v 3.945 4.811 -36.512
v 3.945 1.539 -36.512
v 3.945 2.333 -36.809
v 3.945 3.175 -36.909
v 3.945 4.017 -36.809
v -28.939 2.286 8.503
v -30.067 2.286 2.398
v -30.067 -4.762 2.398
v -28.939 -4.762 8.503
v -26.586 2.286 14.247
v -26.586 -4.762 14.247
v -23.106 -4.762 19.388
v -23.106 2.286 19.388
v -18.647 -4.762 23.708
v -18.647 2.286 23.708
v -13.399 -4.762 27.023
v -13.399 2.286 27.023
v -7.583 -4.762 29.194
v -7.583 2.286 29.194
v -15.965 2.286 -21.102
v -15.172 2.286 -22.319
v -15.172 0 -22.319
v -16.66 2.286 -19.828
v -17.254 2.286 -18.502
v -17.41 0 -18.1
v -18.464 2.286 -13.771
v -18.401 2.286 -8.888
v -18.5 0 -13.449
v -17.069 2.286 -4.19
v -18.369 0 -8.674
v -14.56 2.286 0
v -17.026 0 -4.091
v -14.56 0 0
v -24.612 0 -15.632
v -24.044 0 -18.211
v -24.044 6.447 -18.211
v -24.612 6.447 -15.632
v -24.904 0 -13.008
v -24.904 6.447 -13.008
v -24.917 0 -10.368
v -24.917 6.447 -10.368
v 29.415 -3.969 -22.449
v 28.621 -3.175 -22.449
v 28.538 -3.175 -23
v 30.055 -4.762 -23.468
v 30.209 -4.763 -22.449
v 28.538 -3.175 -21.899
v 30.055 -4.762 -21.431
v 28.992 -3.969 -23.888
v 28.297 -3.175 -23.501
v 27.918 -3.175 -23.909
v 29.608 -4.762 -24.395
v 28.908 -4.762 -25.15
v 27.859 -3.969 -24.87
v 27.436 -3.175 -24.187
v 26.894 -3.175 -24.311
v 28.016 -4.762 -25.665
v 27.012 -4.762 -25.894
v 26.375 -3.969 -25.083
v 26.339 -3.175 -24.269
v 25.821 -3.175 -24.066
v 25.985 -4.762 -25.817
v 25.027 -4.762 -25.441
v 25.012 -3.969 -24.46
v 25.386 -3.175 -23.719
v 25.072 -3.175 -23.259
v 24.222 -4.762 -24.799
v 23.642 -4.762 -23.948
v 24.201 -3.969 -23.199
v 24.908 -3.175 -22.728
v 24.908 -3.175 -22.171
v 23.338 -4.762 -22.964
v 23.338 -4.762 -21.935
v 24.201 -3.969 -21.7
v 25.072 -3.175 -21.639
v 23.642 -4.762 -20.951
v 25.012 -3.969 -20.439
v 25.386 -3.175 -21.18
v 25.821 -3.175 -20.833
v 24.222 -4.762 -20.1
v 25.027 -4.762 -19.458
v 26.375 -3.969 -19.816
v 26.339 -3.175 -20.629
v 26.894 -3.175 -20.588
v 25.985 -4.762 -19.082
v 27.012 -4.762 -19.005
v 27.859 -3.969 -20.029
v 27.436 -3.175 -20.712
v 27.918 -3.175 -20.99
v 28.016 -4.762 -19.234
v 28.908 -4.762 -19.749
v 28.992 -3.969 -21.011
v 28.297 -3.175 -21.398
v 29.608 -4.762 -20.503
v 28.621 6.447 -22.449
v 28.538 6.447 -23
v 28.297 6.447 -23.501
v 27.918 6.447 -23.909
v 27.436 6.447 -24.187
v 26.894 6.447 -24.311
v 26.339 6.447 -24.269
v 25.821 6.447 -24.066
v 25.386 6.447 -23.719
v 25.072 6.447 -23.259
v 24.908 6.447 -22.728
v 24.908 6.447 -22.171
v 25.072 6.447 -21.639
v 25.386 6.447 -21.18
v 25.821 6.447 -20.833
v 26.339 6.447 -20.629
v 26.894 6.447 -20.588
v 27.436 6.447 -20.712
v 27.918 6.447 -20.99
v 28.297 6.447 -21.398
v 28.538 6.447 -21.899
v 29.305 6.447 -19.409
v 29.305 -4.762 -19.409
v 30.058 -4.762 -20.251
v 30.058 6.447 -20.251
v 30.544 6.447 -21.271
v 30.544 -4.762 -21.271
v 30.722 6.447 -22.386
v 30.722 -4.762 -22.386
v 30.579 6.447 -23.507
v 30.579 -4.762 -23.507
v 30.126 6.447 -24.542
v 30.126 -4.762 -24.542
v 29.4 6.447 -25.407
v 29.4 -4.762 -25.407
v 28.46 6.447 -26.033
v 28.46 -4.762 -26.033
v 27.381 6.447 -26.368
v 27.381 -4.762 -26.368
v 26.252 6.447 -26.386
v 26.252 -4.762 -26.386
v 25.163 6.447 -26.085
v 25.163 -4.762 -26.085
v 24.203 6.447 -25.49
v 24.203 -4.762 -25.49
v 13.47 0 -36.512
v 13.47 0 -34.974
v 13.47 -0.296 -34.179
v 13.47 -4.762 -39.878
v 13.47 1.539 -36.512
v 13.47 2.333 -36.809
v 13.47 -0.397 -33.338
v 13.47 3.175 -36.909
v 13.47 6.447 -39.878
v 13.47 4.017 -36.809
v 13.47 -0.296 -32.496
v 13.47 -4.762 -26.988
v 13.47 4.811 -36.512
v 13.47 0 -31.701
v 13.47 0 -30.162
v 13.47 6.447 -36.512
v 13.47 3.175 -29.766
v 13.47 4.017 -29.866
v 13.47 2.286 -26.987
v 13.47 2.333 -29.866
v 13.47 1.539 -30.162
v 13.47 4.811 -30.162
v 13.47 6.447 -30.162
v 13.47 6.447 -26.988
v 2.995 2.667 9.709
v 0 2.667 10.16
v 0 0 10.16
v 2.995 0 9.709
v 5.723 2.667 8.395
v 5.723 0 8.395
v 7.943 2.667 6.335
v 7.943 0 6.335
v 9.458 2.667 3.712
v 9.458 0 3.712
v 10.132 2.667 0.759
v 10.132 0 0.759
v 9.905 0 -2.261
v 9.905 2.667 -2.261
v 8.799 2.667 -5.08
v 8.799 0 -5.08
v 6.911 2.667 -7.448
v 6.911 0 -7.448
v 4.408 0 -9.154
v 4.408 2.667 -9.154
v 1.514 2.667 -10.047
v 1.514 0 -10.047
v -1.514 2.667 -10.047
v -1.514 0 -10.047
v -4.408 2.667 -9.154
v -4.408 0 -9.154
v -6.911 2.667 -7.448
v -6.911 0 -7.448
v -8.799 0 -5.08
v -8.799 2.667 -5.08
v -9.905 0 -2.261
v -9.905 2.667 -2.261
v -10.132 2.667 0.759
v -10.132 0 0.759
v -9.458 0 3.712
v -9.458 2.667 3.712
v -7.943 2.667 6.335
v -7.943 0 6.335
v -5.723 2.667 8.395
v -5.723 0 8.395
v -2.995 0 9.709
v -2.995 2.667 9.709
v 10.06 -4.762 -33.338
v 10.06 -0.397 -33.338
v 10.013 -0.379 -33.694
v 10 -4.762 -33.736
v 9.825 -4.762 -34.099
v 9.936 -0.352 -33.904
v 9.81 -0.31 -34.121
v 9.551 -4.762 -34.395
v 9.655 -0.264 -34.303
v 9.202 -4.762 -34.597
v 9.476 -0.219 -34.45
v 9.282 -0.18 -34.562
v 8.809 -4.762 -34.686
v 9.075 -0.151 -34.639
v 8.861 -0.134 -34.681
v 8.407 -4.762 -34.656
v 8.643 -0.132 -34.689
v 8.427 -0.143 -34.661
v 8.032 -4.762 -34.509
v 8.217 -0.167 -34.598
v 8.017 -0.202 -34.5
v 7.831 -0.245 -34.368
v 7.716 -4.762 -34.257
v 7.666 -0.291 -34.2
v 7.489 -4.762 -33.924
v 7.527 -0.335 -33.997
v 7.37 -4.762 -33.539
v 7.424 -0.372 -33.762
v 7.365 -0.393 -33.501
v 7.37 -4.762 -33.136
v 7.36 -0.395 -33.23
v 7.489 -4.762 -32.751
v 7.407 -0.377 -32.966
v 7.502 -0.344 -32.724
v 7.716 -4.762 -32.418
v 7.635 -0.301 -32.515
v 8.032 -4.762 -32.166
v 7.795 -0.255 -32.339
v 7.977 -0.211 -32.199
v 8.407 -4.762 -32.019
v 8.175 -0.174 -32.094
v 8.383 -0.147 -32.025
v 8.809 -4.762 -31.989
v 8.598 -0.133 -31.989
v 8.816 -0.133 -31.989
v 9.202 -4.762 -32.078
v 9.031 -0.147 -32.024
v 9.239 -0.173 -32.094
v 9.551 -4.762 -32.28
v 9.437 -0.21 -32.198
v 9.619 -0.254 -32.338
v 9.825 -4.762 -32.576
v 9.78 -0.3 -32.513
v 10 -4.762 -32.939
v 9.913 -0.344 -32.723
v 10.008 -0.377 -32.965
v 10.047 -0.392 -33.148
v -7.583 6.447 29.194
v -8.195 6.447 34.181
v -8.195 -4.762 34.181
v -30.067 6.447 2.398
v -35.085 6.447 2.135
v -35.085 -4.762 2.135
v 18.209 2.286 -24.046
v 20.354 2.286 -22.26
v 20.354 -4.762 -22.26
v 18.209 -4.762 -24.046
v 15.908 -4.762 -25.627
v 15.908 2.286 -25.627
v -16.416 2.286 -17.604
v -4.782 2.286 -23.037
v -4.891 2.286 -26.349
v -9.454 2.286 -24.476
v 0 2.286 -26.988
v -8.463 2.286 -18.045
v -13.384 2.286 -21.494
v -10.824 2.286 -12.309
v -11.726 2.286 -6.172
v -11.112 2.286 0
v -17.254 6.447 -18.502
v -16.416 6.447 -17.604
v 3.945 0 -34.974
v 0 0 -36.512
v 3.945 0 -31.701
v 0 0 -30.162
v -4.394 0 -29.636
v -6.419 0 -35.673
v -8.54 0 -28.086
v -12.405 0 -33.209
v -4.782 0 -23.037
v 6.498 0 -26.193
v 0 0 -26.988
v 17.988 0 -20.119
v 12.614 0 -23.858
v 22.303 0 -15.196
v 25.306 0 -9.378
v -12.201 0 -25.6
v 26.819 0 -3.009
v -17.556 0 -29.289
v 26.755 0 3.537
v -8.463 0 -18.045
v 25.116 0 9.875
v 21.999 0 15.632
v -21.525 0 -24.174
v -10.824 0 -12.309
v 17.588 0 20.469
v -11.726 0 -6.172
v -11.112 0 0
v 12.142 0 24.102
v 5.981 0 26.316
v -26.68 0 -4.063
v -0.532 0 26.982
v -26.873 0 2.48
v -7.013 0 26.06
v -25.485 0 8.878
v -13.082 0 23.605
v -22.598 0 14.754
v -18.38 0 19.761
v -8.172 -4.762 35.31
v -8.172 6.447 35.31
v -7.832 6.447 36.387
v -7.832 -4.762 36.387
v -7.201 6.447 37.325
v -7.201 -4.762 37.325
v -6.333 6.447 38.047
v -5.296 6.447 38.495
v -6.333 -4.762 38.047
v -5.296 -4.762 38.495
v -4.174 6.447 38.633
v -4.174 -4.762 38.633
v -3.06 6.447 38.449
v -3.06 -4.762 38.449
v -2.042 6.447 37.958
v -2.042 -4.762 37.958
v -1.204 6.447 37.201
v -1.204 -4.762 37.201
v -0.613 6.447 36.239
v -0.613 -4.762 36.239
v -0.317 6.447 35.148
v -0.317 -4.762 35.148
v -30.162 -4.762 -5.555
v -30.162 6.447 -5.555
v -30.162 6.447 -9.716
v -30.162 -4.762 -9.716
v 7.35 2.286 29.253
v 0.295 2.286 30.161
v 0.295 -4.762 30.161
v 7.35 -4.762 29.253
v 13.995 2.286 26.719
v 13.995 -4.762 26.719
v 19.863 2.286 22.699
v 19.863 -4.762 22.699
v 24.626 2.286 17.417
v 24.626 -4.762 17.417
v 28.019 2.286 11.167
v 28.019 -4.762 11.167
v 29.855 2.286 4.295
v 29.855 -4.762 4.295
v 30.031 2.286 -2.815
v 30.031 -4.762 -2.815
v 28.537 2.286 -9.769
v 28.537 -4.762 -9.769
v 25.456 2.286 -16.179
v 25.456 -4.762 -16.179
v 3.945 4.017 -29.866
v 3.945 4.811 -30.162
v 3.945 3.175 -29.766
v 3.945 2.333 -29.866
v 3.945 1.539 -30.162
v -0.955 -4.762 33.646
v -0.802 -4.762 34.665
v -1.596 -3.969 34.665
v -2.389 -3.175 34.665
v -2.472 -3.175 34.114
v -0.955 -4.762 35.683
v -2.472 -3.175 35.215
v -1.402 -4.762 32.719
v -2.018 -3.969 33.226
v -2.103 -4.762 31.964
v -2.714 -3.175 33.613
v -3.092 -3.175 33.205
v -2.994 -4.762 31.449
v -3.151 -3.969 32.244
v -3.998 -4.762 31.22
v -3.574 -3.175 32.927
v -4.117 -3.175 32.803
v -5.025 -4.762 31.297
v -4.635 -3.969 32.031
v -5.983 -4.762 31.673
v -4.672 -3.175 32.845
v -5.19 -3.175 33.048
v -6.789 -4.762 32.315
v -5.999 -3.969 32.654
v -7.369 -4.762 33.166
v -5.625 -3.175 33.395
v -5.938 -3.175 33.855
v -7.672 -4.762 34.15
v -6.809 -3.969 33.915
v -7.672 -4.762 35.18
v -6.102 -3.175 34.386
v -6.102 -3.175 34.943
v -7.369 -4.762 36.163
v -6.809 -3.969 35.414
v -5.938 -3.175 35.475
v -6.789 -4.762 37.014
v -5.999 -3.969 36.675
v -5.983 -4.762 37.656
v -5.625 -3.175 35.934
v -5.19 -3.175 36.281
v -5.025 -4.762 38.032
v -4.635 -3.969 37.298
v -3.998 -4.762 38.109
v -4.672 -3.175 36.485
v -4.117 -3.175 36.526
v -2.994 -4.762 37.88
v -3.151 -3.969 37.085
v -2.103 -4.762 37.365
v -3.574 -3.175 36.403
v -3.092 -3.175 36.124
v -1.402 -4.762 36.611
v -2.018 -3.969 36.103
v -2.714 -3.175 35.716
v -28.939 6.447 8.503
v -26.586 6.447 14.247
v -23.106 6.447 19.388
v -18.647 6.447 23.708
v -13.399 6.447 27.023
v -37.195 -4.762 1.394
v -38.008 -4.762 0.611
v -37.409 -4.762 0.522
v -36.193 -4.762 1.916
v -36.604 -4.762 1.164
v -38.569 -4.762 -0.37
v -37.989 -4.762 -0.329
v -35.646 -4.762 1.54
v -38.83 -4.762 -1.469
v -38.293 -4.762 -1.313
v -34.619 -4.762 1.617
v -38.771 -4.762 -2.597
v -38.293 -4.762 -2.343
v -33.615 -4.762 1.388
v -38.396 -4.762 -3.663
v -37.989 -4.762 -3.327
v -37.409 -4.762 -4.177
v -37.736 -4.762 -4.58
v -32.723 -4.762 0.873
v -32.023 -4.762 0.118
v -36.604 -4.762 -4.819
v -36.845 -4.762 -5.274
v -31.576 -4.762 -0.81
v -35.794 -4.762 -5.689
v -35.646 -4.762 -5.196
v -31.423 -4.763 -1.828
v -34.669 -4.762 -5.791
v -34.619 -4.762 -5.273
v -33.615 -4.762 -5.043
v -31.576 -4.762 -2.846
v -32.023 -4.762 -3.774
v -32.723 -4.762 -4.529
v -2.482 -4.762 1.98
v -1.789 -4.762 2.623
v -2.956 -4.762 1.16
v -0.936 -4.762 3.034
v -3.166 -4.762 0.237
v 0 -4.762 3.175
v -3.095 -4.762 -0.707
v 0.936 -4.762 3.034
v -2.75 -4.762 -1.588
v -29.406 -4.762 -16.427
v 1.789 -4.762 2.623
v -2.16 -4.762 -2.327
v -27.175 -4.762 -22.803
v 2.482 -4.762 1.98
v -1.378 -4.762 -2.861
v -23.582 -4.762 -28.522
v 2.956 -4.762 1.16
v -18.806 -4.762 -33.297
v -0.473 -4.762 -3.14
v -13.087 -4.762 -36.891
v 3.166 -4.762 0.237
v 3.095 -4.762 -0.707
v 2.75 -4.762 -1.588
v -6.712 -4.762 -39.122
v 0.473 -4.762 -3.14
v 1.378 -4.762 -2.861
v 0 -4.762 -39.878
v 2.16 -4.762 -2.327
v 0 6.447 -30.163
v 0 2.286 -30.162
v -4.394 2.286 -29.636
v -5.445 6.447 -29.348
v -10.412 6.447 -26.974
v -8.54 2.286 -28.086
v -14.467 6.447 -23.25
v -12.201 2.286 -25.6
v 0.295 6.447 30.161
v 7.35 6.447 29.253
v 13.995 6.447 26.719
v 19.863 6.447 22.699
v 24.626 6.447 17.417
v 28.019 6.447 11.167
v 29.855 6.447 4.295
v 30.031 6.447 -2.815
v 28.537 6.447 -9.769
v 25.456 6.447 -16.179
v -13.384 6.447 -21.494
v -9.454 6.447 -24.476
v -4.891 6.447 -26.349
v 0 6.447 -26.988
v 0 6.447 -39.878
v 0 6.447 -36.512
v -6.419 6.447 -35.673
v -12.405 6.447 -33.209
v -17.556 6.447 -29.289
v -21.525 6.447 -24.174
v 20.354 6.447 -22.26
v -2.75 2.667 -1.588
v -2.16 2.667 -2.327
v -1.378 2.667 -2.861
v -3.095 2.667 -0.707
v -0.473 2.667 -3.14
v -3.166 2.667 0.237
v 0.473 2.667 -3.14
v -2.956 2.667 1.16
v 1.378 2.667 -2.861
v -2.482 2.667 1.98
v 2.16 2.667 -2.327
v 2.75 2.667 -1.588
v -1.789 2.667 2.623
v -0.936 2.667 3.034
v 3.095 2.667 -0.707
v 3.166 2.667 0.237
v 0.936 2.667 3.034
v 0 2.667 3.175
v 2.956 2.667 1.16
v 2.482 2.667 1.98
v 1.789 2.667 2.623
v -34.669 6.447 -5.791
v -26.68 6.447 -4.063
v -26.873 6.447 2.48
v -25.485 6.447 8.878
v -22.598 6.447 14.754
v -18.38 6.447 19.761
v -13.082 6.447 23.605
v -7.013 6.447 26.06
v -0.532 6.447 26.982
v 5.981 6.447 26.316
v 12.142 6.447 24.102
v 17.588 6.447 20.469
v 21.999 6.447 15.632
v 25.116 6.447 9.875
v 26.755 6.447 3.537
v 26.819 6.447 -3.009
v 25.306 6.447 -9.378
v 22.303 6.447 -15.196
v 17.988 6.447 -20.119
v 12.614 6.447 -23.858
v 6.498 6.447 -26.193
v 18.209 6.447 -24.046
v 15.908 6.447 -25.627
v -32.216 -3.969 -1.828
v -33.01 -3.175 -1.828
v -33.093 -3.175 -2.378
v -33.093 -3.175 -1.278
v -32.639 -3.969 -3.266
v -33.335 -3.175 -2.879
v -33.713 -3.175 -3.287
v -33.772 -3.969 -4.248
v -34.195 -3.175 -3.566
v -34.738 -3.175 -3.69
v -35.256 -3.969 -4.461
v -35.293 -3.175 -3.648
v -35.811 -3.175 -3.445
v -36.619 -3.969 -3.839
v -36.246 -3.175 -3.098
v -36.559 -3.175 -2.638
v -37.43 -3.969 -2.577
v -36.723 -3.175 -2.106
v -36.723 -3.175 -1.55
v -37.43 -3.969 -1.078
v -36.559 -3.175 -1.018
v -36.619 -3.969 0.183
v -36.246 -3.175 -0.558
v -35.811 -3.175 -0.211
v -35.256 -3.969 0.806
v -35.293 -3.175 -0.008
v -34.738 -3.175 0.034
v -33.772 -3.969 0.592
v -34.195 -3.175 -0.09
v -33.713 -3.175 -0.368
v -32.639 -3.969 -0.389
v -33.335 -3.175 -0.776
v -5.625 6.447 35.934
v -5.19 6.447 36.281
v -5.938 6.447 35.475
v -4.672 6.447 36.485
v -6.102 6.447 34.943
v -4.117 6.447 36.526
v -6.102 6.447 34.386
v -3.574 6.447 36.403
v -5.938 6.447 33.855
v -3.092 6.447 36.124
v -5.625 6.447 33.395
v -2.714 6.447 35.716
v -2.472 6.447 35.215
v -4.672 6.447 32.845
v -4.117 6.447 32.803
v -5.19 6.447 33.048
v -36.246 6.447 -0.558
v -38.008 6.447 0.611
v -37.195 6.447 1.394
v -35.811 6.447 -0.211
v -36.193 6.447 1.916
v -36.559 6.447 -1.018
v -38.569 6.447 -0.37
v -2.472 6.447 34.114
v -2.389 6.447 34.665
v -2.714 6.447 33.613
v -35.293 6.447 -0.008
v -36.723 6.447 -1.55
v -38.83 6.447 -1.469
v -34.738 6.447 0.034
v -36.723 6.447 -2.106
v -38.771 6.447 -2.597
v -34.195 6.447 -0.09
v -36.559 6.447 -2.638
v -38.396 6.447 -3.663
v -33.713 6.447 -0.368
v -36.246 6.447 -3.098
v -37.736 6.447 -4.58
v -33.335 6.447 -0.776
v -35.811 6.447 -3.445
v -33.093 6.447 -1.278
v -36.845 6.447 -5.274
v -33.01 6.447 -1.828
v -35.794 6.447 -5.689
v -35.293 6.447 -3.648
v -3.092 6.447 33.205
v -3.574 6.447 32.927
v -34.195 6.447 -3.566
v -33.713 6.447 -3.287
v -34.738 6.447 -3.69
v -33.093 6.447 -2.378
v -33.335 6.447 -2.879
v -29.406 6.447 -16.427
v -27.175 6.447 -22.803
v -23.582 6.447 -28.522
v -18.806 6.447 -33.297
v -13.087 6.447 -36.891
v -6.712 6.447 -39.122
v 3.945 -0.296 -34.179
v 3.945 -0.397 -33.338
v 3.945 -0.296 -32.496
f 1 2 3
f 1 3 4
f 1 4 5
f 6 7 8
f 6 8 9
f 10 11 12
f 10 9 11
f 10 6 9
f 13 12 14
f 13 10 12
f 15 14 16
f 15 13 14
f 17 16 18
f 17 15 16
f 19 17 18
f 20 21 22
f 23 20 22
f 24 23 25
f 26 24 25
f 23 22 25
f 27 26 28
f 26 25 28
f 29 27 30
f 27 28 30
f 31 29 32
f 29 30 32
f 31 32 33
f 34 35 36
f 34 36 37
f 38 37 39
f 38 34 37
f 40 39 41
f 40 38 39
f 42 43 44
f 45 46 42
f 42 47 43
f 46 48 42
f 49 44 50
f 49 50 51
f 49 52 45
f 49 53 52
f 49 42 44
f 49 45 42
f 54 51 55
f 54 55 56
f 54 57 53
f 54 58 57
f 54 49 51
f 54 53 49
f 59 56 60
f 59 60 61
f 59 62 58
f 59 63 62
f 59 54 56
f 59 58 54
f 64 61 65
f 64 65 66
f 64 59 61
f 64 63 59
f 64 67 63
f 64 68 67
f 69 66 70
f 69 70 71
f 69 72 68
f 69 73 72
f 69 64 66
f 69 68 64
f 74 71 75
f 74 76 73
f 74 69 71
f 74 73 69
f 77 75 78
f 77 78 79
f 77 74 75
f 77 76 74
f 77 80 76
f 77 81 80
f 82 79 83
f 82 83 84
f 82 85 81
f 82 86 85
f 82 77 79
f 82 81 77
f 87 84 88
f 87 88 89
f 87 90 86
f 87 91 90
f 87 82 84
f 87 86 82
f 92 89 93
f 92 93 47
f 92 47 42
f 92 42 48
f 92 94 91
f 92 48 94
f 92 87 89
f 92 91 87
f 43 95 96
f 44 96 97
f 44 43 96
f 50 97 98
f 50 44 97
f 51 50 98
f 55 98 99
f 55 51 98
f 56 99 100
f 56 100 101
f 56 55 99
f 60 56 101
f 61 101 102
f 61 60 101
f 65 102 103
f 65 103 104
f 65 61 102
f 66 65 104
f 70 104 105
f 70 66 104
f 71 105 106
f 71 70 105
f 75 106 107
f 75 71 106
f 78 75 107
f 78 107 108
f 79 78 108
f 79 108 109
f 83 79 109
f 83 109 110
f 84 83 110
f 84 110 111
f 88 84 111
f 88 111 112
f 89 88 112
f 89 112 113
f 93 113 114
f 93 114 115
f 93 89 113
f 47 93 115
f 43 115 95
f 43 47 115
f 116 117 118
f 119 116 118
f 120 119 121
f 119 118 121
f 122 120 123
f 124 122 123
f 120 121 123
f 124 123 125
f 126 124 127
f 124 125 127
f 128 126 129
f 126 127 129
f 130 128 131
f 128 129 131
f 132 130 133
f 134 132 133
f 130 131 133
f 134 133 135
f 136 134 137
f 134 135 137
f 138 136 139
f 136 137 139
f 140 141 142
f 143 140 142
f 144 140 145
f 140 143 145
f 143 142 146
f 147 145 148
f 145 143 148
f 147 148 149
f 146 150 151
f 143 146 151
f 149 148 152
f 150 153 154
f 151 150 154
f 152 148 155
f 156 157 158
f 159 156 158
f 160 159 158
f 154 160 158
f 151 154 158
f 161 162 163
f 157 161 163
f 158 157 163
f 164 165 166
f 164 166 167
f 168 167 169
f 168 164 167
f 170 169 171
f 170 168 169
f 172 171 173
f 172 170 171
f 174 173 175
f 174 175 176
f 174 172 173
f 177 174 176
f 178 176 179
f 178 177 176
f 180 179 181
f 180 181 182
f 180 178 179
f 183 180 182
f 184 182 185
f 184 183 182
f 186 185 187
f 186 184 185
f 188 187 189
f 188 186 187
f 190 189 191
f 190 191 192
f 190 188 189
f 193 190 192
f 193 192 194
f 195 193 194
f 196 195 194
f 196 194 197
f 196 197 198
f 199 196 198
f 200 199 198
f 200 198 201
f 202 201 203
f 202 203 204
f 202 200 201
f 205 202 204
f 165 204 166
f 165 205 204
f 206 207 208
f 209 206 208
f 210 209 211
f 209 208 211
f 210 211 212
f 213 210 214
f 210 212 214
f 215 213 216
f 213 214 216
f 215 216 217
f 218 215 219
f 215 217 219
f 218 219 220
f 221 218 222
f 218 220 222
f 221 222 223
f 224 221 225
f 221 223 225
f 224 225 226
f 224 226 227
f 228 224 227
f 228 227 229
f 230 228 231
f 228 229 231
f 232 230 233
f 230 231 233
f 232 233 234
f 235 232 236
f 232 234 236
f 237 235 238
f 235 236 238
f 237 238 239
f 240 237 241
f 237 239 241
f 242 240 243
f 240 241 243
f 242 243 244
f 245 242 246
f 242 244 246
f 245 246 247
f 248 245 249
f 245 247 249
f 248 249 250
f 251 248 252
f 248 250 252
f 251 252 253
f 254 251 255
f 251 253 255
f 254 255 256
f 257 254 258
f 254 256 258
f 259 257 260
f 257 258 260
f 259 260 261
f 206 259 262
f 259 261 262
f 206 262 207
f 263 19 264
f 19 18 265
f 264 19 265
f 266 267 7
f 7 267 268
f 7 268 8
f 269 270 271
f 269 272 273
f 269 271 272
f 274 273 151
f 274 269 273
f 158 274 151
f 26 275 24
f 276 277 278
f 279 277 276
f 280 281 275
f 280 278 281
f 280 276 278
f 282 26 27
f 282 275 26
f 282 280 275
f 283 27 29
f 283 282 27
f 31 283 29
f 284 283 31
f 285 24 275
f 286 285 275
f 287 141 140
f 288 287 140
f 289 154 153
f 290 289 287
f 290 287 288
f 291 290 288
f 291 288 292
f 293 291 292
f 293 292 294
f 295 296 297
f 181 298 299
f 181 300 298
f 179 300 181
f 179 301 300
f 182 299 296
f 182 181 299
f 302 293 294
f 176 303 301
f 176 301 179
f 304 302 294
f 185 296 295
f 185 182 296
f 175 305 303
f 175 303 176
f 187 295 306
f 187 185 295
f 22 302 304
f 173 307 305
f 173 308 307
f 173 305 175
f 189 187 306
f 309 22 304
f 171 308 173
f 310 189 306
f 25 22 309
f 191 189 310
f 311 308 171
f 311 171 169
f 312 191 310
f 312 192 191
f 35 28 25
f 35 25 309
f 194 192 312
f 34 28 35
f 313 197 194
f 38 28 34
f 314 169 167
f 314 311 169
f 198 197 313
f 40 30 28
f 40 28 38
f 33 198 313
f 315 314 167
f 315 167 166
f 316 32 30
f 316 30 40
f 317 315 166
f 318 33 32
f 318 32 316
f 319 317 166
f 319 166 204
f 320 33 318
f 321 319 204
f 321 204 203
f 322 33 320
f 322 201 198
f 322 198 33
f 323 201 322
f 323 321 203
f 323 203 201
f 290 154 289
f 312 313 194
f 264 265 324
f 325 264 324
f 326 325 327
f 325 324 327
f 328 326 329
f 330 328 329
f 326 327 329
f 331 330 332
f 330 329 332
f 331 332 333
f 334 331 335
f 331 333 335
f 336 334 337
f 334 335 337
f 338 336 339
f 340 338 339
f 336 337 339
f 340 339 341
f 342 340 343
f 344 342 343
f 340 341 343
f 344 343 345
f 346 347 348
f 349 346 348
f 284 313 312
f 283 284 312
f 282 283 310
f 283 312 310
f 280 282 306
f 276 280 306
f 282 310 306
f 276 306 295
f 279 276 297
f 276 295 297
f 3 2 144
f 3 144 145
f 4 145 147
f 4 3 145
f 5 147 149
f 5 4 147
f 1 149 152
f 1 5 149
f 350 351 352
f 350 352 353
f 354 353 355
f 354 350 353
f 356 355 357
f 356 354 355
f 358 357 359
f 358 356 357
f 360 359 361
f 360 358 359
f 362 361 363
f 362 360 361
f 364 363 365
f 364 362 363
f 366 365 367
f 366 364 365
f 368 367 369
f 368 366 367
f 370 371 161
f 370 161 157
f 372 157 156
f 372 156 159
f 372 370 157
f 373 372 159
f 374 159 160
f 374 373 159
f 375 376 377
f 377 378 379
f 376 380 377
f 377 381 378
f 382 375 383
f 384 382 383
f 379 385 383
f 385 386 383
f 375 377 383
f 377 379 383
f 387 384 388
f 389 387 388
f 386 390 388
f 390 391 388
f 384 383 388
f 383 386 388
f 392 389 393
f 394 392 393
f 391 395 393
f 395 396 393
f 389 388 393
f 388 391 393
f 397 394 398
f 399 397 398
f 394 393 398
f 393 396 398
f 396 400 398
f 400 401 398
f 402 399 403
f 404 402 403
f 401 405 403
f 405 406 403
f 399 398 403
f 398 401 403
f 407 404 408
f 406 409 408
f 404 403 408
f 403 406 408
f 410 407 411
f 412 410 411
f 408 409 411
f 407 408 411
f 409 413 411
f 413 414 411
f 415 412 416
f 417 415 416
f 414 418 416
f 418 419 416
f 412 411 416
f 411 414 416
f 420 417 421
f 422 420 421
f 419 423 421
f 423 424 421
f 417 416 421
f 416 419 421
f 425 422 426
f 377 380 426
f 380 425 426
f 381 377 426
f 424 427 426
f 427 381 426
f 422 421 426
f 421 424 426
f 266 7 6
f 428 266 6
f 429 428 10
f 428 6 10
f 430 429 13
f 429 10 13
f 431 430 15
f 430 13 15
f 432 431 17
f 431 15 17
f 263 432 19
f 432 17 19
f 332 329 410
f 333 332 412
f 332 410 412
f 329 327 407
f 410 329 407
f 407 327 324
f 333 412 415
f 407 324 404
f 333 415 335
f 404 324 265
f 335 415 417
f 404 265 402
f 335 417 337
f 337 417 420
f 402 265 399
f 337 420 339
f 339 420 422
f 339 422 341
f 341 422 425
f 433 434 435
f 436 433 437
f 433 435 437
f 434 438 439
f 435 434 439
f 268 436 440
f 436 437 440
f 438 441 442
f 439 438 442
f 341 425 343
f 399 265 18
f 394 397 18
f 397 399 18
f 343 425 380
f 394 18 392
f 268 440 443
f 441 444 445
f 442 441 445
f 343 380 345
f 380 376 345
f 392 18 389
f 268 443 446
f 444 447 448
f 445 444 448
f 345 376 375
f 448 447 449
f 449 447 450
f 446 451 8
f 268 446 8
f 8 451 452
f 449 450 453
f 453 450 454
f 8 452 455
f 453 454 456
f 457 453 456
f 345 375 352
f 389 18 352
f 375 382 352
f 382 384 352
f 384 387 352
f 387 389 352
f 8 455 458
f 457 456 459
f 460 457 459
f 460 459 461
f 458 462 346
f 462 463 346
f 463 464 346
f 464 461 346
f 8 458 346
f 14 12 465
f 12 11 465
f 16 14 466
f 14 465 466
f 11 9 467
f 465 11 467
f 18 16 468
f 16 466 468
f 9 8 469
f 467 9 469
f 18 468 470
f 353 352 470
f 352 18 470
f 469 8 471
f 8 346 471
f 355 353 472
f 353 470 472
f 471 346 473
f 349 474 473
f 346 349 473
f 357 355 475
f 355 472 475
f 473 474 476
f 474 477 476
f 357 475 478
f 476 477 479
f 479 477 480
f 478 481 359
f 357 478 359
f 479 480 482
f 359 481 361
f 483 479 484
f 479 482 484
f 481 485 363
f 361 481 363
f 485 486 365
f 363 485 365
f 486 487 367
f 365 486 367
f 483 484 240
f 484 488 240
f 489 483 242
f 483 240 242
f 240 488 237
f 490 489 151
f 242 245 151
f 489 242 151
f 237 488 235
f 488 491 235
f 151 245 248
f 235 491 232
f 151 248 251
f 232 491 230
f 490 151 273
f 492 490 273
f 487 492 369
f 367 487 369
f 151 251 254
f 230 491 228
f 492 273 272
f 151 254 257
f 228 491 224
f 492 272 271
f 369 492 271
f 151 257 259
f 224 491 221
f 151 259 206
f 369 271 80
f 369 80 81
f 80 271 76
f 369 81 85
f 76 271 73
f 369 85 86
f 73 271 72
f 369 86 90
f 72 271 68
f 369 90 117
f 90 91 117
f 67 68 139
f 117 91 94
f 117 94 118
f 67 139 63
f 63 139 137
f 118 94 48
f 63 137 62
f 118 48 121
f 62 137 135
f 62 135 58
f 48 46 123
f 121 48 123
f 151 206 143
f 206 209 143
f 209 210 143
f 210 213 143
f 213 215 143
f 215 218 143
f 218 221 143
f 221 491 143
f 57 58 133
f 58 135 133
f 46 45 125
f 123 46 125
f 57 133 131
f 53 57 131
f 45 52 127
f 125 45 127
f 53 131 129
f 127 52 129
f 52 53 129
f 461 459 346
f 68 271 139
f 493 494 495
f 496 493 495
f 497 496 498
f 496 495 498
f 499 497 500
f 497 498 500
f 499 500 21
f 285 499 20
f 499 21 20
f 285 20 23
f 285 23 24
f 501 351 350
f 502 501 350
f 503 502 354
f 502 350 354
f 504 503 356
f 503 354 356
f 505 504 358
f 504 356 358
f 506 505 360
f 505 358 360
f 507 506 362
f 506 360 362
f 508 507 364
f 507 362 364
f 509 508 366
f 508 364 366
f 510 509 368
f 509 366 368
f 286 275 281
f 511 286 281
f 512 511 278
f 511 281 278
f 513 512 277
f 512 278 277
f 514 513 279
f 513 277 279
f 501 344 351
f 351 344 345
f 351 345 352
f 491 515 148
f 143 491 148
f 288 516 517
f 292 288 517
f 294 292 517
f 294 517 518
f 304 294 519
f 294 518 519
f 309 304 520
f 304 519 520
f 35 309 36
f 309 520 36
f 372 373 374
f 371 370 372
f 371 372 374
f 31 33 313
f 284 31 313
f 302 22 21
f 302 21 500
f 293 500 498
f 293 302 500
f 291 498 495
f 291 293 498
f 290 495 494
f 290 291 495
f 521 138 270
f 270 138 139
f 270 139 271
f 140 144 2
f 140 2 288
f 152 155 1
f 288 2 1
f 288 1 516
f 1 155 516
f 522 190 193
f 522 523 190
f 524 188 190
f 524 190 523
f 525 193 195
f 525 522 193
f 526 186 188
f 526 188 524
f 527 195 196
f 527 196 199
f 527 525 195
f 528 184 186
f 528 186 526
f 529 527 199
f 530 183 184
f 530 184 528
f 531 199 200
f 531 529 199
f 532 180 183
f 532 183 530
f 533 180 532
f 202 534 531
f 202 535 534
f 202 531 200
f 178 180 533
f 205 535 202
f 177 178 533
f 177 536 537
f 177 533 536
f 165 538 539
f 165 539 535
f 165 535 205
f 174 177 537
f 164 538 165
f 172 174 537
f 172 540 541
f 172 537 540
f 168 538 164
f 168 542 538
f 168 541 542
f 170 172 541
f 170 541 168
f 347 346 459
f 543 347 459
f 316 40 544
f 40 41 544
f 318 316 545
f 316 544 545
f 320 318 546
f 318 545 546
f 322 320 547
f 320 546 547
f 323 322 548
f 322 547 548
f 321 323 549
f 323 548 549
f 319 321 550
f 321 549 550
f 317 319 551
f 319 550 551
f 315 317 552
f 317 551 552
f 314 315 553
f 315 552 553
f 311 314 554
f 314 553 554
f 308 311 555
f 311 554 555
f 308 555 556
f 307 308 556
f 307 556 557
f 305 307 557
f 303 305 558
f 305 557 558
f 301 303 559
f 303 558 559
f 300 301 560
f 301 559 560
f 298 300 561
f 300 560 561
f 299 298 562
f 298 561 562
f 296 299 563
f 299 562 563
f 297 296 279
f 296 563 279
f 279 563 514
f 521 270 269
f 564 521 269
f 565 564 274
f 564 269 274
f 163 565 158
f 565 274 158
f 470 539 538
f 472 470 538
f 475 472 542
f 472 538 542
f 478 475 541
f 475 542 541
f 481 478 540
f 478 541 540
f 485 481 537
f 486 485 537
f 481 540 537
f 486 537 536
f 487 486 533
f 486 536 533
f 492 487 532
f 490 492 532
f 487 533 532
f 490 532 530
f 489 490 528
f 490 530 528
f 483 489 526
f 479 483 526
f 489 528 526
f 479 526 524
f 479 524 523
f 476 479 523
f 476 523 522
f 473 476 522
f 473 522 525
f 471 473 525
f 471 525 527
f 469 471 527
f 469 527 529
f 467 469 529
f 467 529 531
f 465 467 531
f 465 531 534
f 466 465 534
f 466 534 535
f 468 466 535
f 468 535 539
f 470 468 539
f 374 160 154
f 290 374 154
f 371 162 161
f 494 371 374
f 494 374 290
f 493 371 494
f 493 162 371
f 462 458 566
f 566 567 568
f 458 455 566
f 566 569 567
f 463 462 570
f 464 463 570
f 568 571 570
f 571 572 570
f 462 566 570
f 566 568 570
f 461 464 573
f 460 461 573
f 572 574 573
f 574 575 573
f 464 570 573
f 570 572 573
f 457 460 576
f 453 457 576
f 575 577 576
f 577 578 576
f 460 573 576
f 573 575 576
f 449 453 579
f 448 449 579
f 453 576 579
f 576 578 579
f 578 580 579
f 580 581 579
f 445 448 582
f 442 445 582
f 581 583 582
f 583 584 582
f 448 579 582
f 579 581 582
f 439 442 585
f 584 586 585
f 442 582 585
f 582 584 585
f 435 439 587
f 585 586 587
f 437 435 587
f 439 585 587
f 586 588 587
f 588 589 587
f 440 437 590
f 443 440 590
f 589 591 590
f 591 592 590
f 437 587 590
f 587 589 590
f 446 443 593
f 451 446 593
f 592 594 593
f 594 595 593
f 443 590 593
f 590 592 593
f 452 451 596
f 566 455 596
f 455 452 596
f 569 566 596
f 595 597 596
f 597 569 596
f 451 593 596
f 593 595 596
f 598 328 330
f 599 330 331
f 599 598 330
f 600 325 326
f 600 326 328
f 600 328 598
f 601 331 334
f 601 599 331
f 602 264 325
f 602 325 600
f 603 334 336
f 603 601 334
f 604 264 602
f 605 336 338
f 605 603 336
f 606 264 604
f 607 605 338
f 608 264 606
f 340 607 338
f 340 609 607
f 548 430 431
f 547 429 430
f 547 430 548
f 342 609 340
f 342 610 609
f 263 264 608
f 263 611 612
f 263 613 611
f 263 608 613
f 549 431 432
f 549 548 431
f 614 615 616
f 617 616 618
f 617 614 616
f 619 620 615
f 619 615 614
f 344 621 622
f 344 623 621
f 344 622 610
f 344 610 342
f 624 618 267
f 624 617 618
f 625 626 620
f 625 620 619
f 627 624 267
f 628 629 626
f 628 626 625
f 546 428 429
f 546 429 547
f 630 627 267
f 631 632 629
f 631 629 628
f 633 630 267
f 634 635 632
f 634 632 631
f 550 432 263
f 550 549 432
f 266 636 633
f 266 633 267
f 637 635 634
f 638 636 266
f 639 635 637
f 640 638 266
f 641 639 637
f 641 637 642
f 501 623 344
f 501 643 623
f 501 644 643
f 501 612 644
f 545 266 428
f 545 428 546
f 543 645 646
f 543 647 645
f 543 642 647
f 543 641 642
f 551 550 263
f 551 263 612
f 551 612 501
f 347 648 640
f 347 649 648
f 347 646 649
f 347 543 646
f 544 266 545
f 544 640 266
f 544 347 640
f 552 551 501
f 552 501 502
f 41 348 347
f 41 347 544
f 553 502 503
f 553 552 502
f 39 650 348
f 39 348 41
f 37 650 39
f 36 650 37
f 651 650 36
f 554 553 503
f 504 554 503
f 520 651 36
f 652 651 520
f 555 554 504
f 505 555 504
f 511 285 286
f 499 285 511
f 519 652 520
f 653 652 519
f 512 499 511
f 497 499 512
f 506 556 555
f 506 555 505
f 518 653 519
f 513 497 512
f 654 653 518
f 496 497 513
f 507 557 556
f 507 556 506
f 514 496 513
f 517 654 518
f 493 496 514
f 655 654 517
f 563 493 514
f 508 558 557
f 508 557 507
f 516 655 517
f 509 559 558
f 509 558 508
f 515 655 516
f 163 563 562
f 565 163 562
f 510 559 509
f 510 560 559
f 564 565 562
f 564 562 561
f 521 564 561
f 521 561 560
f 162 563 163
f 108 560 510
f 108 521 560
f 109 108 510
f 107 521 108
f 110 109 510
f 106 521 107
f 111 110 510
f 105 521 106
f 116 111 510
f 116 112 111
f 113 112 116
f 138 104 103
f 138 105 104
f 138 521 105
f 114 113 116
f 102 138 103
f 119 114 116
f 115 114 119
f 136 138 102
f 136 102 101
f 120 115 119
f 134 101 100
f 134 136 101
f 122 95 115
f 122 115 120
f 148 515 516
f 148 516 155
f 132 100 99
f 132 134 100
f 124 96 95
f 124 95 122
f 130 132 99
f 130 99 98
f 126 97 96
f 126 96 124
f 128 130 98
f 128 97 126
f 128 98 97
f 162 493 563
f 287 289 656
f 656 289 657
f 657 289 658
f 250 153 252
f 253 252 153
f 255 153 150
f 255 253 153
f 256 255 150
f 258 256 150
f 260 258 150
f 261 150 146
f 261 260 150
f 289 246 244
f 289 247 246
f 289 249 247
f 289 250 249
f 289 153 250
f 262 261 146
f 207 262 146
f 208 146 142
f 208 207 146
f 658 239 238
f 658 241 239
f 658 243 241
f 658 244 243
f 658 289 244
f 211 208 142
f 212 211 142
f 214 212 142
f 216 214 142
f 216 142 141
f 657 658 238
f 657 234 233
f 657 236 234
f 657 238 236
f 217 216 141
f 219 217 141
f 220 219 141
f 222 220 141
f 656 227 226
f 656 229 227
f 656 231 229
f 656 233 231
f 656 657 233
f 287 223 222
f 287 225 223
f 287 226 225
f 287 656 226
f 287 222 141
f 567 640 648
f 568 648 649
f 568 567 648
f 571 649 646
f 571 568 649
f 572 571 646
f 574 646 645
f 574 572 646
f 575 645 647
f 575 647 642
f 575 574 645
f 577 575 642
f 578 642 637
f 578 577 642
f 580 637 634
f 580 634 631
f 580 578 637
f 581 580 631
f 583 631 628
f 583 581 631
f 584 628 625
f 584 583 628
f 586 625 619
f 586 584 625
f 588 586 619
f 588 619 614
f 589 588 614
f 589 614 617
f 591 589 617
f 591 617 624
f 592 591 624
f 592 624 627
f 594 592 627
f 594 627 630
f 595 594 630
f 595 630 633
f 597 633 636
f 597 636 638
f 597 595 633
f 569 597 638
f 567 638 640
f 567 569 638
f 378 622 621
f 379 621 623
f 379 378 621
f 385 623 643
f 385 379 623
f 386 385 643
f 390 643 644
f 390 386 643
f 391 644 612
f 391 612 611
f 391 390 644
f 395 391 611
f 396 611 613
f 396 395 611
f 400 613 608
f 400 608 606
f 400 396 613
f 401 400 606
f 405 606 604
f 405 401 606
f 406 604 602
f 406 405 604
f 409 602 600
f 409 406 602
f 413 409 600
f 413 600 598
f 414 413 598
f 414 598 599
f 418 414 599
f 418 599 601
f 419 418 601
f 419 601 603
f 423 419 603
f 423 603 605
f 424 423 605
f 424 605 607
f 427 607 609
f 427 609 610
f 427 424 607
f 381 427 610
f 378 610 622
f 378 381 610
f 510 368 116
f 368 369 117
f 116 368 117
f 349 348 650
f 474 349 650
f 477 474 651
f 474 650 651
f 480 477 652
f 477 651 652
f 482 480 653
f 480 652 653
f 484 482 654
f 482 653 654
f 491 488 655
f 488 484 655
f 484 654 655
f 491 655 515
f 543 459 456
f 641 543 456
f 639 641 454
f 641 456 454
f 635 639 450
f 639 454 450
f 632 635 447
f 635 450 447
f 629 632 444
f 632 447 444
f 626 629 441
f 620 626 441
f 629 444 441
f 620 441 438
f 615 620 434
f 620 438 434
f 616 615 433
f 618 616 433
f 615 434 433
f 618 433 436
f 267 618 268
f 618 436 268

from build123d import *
from build123d.topology import SkipClean

# Parameters (mm, degrees)
SKETCH1_R          = 30.1625
SKETCH1_R_2        = 3.175
EXTRUDE1_DEPTH     = 4.7625
EXTRUDE2_START     = 2.286
SKETCH2_R          = 30.1625
SKETCH2_R_2        = 26.9875
EXTRUDE2_DEPTH     = 2.286
EXTRUDE3_DEPTH     = 2.286
CUT_EXTRUDE1_START = -2.286
CUT_EXTRUDE1_DEPTH = 2.286
EXTRUDE4_DEPTH     = 4.16052
EXTRUDE6_START     = -4.7625
EXTRUDE6_DEPTH     = 4.7625
EXTRUDE7_START     = 6.44652
EXTRUDE7_DEPTH     = 6.44652
EXTRUDE8_START     = -4.7625
EXTRUDE8_OUTLINE_R = 1.8669
EXTRUDE8_DEPTH     = 11.20902
EXTRUDE8_START_2   = 3.945384182
EXTRUDE8_2_DEPTH   = 9.525
EXTRUDE9_START     = 2.667
SKETCH11_R         = 10.16
SKETCH11_R_2       = 3.175
EXTRUDE9_DEPTH     = 2.667
CHAMFER1_SIZE      = 1.5875
SPLIT1_OUTLINE_W   = 1.35255
SPLIT1_OUTLINE_H   = 4.631769236


# Read off the part's stored shape, not the designer's step: Extrude8, Split1
with BuildPart() as part:
    # Sketch1 → Extrude1 (new body)
    with BuildSketch(Plane(origin=(0, 0, 0), x_dir=(1, 0, 0), z_dir=(0, 1, 0))):
        with Locations(Location((0, 0, 0), (0, 0, 270))):
            Circle(SKETCH1_R)
        with Locations(Location((0, 0, 0), (0, 0, 270))):
            Circle(SKETCH1_R_2, mode=Mode.SUBTRACT)
    extrude(amount=-EXTRUDE1_DEPTH)

    # Sketch2 → Extrude2 (add)
    with BuildSketch(Plane(origin=(0, 0, 0), x_dir=(-1, 0, 0), z_dir=(0, 1, 0)).offset(EXTRUDE2_START)):
        with Locations(Location((0, 0, 0), (0, 0, 90))):
            Circle(SKETCH2_R)
        with Locations(Location((0, 0, 0), (0, 0, 90))):
            Circle(SKETCH2_R_2, mode=Mode.SUBTRACT)
    extrude(amount=-EXTRUDE2_DEPTH)

    # Sketch3 → Extrude3 (add)
    with BuildSketch(Plane(origin=(0, 0, 0), x_dir=(-1, 0, 0), z_dir=(0, 1, 0))):
        with BuildLine():
            Line((0, -26.9875), (0, -30.1625))
            ThreePointArc((0, -30.1625), (16.746389739, -19.65084319), (14.559871939, 0))
            Line((14.559871939, 0), (11.1125, 0))
            ThreePointArc((11.1125, 0), (9.819400834, -15.249165049), (0, -26.9875))
        make_face()
    extrude(amount=EXTRUDE3_DEPTH)

    # Sketch4 → Cut-Extrude1 (cut)
    with BuildSketch(Plane(origin=(0, 2.286, 0), x_dir=(-1, 0, 0), z_dir=(0, 1, 0)).offset(CUT_EXTRUDE1_START)):
        with BuildLine():
            ThreePointArc((0, -30.1625), (13.425358958, -27.009926751), (24.044290895, -18.211218564))
            ThreePointArc((24.044290895, -18.211218564), (24.79254584, -14.324226887), (24.91653318, -10.367812235))
            ThreePointArc((24.91653318, -10.367812235), (20.915943614, -17.054279785), (15.171790072, -22.31909367))
            ThreePointArc((15.171790072, -22.31909367), (8.539646316, -28.085673104), (0, -30.1625))
        make_face()
    extrude(amount=CUT_EXTRUDE1_DEPTH, mode=Mode.SUBTRACT)

    # Sketch5 → Extrude4 (add)
    with SkipClean():  # the faces are left unmerged after this step: merging them gives an invalid solid
        with BuildSketch(Plane(origin=(0, 2.286, 0), x_dir=(-1, 0, 0), z_dir=(0, 1, 0))):
            with BuildLine():
                ThreePointArc((0, -30.1625), (10.41213166, -26.974120661), (17.253717724, -18.502347019))
                Line((17.253717724, -18.502347019), (16.415554359, -17.603526852))
                ThreePointArc((16.415554359, -17.603526852), (9.454223619, -24.475944781), (0, -26.9875))
                ThreePointArc((0, -26.9875), (-14.975376849, 22.451352843), (24.91653318, -10.367812235))
                ThreePointArc((24.91653318, -10.367812235), (24.79254584, -14.324226887), (24.044290895, -18.211218564))
                ThreePointArc((24.044290895, -18.211218564), (-13.425358958, 27.009926751), (0, -30.1625))
            make_face()
        extrude(amount=EXTRUDE4_DEPTH)

    # Sketch7 → Extrude6 (add)
    with BuildSketch(Plane.XZ.offset(4.7625).offset(EXTRUDE6_START)):
        with BuildLine():
            Line((13.470384182, -39.878), (0, -39.878))
            ThreePointArc((0, -39.878), (-21.328108288, -31.043608288), (-30.1625, -9.7155))
            Line((-30.1625, -9.7155), (-30.1625, 0))
            ThreePointArc((-30.1625, 0), (-21.328108288, -21.328108288), (0, -30.1625))
            ThreePointArc((0, -30.1625), (6.919752073, -29.358021689), (13.470384182, -26.9875))
            Line((13.470384182, -26.9875), (13.470384182, -39.878))
        make_face()
    extrude(amount=EXTRUDE6_DEPTH)

    # Sketch8 → Extrude7 (add)
    with BuildSketch(Plane(origin=(0, 0, 0), x_dir=(-1, 0, 0), z_dir=(0, 1, 0)).offset(EXTRUDE7_START)):
        with BuildLine():
            Line((-13.470384182, -39.878), (-13.470384182, -36.5125))
            Line((-13.470384182, -36.5125), (0, -36.5125))
            ThreePointArc((0, -36.5125), (15.108481284, -31.416698661), (24.044290895, -18.211218564))
            ThreePointArc((24.044290895, -18.211218564), (28.592064724, -9.605740006), (30.1625, 0))
            Line((30.1625, 0), (30.1625, -9.7155))
            ThreePointArc((30.1625, -9.7155), (21.328108288, -31.043608288), (0, -39.878))
            Line((0, -39.878), (-13.470384182, -39.878))
        make_face()
        with BuildLine():
            Line((-13.470384182, -30.1625), (0, -30.1625))
            ThreePointArc((0, -30.1625), (-6.919752073, -29.358021689), (-13.470384182, -26.9875))
            Line((-13.470384182, -26.9875), (-13.470384182, -30.1625))
        make_face()
    extrude(amount=-EXTRUDE7_DEPTH)

    # Extrude8 outline → Extrude8 (add)
    # profile 1 of 3: a face of its own
    with BuildSketch(Plane(origin=(0, 0, 0), x_dir=(1, 0, 0), z_dir=(0, 1, 0)).offset(EXTRUDE8_START)):
        with BuildLine():
            Line((-30.1625, 0), (-30.1625, 5.554946141))
            Line((-30.1625, 5.554946141), (-34.669428175, 5.791144238))
            ThreePointArc((-34.669428175, 5.791144238), (-38.840447467, 2.035541598), (-35.084844828, -2.135477694))
            Line((-35.084844828, -2.135477694), (-30.066989082, -2.398452371))
            ThreePointArc((-30.066989082, -2.398452371), (-30.138612812, -1.200176665), (-30.1625, 0))
        make_face()
        with Locations((-34.877136501, 1.827833272)):
            Circle(EXTRUDE8_OUTLINE_R, mode=Mode.SUBTRACT)
    # profile 2 of 3: a face of its own
    with BuildSketch(Plane(origin=(0, 0, 0), x_dir=(1, 0, 0), z_dir=(0, 1, 0)).offset(EXTRUDE8_START)):
        with BuildLine():
            ThreePointArc((20.353863178, 22.259754266), (23.105815515, 19.388081277), (25.45598983, 16.179276498))
            Line((25.45598983, 16.179276498), (29.305165502, 19.409118385))
            ThreePointArc((29.305165502, 19.409118385), (29.79434106, 25.000420595), (24.20303885, 25.489596152))
            Line((24.20303885, 25.489596152), (20.353863178, 22.259754266))
        make_face()
        with Locations((26.754102176, 22.449357268)):
            Circle(EXTRUDE8_OUTLINE_R, mode=Mode.SUBTRACT)
    # profile 3 of 3: a face of its own
    with BuildSketch(Plane(origin=(0, 0, 0), x_dir=(1, 0, 0), z_dir=(0, 1, 0)).offset(EXTRUDE8_START)):
        with BuildLine():
            ThreePointArc((0.295242727, -30.161054988), (-3.67588407, -29.937673299), (-7.583092352, -29.193717074))
            Line((-7.583092352, -29.193717074), (-8.195454358, -34.181005389))
            ThreePointArc((-8.195454358, -34.181005389), (-4.739955775, -38.603841885), (-0.317119279, -35.148343303))
            Line((-0.317119279, -35.148343303), (0.295242727, -30.161054988))
        make_face()
        with Locations((-4.256286818, -34.664674346)):
            Circle(EXTRUDE8_OUTLINE_R, mode=Mode.SUBTRACT)
    extrude(amount=EXTRUDE8_DEPTH)

    # Extrude8 2 outline → Extrude8 2 (cut)
    with BuildSketch(Plane.YZ.offset(EXTRUDE8_START_2)):
        with BuildLine():
            Line((1.538642455, -30.1625), (4.811357545, -30.1625))
            ThreePointArc((4.811357545, -30.1625), (3.175, -29.765625), (1.538642455, -30.1625))
        make_face()
        with BuildLine():
            Line((0, -34.973857545), (0, -31.701142455))
            ThreePointArc((0, -31.701142455), (-0.396875, -33.3375), (0, -34.973857545))
        make_face()
        with BuildLine():
            ThreePointArc((1.538642455, -36.5125), (3.175, -36.909375), (4.811357545, -36.5125))
            Line((4.811357545, -36.5125), (1.538642455, -36.5125))
        make_face()
    extrude(amount=EXTRUDE8_2_DEPTH, mode=Mode.SUBTRACT)

    # Sketch11 → Extrude9 (add)
    with BuildSketch(Plane(origin=(0, 0, 0), x_dir=(-1, 0, 0), z_dir=(0, 1, 0)).offset(EXTRUDE9_START)):
        with Locations(Location((0, 0, 0), (0, 0, 90))):
            Circle(SKETCH11_R)
        with Locations(Location((0, 0, 0), (0, 0, 90))):
            Circle(SKETCH11_R_2, mode=Mode.SUBTRACT)
    extrude(amount=-EXTRUDE9_DEPTH)

    # Chamfer1
    chamfer1_edges = [part.edges().sort_by_distance(p)[0] for p in [
        (-36.744036501, -4.7625, -1.827833272),
        (-6.123186818, -4.7625, 34.664674346),
        (24.887202176, -4.7625, -22.449357268),
    ]]
    chamfer(chamfer1_edges, length=CHAMFER1_SIZE)

    # Split1 outline → Split1 (revolve, cut)
    with SkipClean():  # the faces are left unmerged after this step: merging them gives an invalid solid
        with BuildSketch(Plane(origin=(8.707884182, 0, -33.3375), x_dir=(1, 0, 0), z_dir=(0, 0, 1))):
            with Locations((0.676275, -2.446615382)):
                Rectangle(SPLIT1_OUTLINE_W, SPLIT1_OUTLINE_H)
        revolve(axis=Axis((8.707884182, 0, -33.3375), (0, 1, 0)), mode=Mode.SUBTRACT)


solid = part.part
